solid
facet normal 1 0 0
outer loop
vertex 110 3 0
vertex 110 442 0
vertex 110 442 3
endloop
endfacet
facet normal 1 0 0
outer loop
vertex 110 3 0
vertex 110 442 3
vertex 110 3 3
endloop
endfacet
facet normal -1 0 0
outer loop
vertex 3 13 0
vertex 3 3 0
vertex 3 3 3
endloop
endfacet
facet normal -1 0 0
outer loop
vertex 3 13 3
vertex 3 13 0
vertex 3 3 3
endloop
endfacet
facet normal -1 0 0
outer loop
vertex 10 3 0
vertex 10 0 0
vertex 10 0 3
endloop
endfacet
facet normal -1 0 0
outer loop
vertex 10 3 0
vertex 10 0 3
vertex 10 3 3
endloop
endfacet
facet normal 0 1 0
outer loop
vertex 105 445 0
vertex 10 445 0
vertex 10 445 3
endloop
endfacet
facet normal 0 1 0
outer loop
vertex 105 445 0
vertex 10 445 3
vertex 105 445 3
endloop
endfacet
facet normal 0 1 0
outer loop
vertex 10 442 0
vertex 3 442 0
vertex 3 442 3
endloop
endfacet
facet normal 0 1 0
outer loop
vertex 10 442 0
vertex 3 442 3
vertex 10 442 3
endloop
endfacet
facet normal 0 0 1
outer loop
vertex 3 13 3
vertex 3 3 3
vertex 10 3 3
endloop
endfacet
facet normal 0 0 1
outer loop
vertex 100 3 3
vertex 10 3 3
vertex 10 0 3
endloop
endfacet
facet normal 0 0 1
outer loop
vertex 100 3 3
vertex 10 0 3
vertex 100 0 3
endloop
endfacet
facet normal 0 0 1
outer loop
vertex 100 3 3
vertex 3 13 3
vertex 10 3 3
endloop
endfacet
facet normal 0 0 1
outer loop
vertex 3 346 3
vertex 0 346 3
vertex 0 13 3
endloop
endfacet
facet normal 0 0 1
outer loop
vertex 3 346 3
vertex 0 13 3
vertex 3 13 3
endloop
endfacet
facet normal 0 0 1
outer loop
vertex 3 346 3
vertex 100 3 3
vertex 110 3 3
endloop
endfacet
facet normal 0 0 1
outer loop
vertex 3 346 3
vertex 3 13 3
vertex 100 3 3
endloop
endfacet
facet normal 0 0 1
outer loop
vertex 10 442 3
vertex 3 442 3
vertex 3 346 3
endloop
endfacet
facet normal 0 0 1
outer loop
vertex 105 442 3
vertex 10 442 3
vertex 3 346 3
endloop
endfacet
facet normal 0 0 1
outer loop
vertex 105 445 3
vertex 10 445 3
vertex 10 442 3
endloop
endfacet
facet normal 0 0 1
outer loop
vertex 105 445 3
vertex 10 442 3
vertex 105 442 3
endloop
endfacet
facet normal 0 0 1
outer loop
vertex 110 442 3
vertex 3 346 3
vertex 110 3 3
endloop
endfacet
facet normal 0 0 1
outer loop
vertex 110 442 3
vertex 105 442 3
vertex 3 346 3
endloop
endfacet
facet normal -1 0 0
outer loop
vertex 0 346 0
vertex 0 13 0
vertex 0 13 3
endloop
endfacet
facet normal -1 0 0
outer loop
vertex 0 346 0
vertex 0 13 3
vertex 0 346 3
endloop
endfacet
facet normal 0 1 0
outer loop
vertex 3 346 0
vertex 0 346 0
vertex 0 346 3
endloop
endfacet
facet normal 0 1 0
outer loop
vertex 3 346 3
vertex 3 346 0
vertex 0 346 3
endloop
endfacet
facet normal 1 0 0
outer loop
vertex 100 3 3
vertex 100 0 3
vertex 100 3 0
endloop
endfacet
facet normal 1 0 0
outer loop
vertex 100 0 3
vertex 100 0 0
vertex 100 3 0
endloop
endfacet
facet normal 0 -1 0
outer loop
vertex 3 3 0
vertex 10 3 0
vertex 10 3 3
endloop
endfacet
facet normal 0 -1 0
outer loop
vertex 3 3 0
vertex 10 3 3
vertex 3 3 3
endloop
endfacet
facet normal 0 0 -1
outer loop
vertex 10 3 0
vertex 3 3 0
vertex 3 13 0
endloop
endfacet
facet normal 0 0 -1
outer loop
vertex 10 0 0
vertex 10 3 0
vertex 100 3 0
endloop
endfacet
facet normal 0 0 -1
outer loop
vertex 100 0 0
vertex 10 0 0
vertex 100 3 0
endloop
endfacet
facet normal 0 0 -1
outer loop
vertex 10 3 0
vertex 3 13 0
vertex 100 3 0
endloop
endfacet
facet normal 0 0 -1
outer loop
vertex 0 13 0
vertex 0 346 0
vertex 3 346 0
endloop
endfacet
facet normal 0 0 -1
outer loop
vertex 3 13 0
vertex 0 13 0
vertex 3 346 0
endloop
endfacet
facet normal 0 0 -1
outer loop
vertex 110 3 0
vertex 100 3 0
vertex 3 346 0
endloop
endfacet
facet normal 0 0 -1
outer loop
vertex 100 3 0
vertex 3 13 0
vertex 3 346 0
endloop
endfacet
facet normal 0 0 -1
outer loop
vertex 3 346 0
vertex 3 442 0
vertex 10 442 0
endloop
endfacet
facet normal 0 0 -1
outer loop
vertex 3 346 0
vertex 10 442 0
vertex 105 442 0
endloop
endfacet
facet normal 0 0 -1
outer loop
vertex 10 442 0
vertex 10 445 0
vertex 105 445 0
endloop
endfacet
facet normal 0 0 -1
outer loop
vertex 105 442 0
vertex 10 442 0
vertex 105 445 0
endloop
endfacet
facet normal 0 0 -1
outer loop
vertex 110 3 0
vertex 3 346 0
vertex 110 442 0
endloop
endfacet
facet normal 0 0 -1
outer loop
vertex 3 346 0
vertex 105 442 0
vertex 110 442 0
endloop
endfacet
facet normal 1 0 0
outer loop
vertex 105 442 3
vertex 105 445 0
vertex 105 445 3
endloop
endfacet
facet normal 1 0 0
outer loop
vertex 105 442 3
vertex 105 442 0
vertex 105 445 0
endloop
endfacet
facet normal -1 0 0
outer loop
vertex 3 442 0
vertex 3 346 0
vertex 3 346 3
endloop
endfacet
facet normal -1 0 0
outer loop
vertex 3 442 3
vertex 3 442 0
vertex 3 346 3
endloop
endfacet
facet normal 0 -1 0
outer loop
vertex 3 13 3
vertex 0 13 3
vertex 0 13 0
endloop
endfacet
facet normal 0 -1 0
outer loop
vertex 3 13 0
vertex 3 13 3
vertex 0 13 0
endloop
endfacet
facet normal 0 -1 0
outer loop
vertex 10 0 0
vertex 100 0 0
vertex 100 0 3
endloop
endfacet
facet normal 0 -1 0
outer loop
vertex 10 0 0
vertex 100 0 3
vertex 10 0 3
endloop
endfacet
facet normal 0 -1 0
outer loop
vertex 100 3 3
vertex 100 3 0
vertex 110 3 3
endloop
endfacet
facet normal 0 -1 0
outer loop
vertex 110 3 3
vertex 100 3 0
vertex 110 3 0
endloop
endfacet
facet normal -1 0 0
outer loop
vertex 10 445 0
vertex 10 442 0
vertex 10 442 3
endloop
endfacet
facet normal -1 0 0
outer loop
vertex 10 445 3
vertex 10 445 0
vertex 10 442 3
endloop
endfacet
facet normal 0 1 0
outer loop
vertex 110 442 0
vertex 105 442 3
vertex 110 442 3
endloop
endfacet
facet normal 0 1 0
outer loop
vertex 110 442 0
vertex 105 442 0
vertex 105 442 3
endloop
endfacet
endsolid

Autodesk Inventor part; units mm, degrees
ref_plane "YZ Plane" through (0, 0, 0) normal (1, 0, 0) x (0, 1, 0)
ref_plane "XZ Plane" through (0, 0, 0) normal (0, 1, 0) x (-1, 0, 0)
ref_plane "XY Plane" through (0, 0, 0) normal (0, 0, 1) x (1, 0, 0)
sketch "Sketch1" plane through (0, 0, 0) normal (0, 0, 1) x (1, 0, 0)
  line L0 (0, 0) -> (0, 442)
  line L1 (0, 442) -> (110, 442)
  line L2 (110, 442) -> (110, 0)
  line L3 (110, 0) -> (0, 0)
  line L4 (10, 0) -> (10, 3)
  line L5 (10, 3) -> (0, 3)
  line L6 (100, 0) -> (100, 3)
  line L7 (100, 3) -> (110, 3)
  dimension "d0" = 442
  dimension "d1" = 110
  dimension "d4" = 3
  dimension "d5" = 90
  dimension "d6" = 10
extrude "Extrusion1" add sketch "Sketch1" along normal blind 3 contours L0 L1 L2 L7 L6 L3 L4 L5
sketch "Sketch4" plane through (0, 3, 0) normal (-1, 0, 0) x (0, 0, 1)
  line L0 (3, 439) -> (3, 0) projected
  line L1 (3, 10) -> (0, 10)
  line L2 (0, 0) -> (3, 0) projected
  line L3 (0, 439) -> (0, 0) projected
  line L4 (0, 343) -> (3.087, 343)
  line L5 (0, 439) -> (3, 439) projected
  point P0 (0, -3)
  point P1 (3, 343)
  dimension "d7" = 10
  dimension "d11" = 333
extrude "Extrusion2" cut sketch "Sketch4" against normal blind 3 contours L0 L2 L3 L1 | L4 L3 L5 L0
sketch "Sketch5" plane through (110, 442, 3) normal (0, 1, 0) x (1, 0, 0)
  line L0 (-10, 3) -> (0, 3) projected
  line L1 (-5, 3) -> (-5, 0)
  line L2 (-10, 0) -> (0, 0) projected
  line L3 (-100, 3) -> (-10, 3) projected
  line L4 (-100, 3) -> (-100, 0)
  line L5 (-100, 0) -> (-10, 0) projected
  line L6 (-110, 0) -> (-110, 3) projected
  dimension "d12" = 10
extrude "Extrusion3" add sketch "Sketch5" along normal blind 3
properties part number "lifting cover" material "PMMA Plastic"
